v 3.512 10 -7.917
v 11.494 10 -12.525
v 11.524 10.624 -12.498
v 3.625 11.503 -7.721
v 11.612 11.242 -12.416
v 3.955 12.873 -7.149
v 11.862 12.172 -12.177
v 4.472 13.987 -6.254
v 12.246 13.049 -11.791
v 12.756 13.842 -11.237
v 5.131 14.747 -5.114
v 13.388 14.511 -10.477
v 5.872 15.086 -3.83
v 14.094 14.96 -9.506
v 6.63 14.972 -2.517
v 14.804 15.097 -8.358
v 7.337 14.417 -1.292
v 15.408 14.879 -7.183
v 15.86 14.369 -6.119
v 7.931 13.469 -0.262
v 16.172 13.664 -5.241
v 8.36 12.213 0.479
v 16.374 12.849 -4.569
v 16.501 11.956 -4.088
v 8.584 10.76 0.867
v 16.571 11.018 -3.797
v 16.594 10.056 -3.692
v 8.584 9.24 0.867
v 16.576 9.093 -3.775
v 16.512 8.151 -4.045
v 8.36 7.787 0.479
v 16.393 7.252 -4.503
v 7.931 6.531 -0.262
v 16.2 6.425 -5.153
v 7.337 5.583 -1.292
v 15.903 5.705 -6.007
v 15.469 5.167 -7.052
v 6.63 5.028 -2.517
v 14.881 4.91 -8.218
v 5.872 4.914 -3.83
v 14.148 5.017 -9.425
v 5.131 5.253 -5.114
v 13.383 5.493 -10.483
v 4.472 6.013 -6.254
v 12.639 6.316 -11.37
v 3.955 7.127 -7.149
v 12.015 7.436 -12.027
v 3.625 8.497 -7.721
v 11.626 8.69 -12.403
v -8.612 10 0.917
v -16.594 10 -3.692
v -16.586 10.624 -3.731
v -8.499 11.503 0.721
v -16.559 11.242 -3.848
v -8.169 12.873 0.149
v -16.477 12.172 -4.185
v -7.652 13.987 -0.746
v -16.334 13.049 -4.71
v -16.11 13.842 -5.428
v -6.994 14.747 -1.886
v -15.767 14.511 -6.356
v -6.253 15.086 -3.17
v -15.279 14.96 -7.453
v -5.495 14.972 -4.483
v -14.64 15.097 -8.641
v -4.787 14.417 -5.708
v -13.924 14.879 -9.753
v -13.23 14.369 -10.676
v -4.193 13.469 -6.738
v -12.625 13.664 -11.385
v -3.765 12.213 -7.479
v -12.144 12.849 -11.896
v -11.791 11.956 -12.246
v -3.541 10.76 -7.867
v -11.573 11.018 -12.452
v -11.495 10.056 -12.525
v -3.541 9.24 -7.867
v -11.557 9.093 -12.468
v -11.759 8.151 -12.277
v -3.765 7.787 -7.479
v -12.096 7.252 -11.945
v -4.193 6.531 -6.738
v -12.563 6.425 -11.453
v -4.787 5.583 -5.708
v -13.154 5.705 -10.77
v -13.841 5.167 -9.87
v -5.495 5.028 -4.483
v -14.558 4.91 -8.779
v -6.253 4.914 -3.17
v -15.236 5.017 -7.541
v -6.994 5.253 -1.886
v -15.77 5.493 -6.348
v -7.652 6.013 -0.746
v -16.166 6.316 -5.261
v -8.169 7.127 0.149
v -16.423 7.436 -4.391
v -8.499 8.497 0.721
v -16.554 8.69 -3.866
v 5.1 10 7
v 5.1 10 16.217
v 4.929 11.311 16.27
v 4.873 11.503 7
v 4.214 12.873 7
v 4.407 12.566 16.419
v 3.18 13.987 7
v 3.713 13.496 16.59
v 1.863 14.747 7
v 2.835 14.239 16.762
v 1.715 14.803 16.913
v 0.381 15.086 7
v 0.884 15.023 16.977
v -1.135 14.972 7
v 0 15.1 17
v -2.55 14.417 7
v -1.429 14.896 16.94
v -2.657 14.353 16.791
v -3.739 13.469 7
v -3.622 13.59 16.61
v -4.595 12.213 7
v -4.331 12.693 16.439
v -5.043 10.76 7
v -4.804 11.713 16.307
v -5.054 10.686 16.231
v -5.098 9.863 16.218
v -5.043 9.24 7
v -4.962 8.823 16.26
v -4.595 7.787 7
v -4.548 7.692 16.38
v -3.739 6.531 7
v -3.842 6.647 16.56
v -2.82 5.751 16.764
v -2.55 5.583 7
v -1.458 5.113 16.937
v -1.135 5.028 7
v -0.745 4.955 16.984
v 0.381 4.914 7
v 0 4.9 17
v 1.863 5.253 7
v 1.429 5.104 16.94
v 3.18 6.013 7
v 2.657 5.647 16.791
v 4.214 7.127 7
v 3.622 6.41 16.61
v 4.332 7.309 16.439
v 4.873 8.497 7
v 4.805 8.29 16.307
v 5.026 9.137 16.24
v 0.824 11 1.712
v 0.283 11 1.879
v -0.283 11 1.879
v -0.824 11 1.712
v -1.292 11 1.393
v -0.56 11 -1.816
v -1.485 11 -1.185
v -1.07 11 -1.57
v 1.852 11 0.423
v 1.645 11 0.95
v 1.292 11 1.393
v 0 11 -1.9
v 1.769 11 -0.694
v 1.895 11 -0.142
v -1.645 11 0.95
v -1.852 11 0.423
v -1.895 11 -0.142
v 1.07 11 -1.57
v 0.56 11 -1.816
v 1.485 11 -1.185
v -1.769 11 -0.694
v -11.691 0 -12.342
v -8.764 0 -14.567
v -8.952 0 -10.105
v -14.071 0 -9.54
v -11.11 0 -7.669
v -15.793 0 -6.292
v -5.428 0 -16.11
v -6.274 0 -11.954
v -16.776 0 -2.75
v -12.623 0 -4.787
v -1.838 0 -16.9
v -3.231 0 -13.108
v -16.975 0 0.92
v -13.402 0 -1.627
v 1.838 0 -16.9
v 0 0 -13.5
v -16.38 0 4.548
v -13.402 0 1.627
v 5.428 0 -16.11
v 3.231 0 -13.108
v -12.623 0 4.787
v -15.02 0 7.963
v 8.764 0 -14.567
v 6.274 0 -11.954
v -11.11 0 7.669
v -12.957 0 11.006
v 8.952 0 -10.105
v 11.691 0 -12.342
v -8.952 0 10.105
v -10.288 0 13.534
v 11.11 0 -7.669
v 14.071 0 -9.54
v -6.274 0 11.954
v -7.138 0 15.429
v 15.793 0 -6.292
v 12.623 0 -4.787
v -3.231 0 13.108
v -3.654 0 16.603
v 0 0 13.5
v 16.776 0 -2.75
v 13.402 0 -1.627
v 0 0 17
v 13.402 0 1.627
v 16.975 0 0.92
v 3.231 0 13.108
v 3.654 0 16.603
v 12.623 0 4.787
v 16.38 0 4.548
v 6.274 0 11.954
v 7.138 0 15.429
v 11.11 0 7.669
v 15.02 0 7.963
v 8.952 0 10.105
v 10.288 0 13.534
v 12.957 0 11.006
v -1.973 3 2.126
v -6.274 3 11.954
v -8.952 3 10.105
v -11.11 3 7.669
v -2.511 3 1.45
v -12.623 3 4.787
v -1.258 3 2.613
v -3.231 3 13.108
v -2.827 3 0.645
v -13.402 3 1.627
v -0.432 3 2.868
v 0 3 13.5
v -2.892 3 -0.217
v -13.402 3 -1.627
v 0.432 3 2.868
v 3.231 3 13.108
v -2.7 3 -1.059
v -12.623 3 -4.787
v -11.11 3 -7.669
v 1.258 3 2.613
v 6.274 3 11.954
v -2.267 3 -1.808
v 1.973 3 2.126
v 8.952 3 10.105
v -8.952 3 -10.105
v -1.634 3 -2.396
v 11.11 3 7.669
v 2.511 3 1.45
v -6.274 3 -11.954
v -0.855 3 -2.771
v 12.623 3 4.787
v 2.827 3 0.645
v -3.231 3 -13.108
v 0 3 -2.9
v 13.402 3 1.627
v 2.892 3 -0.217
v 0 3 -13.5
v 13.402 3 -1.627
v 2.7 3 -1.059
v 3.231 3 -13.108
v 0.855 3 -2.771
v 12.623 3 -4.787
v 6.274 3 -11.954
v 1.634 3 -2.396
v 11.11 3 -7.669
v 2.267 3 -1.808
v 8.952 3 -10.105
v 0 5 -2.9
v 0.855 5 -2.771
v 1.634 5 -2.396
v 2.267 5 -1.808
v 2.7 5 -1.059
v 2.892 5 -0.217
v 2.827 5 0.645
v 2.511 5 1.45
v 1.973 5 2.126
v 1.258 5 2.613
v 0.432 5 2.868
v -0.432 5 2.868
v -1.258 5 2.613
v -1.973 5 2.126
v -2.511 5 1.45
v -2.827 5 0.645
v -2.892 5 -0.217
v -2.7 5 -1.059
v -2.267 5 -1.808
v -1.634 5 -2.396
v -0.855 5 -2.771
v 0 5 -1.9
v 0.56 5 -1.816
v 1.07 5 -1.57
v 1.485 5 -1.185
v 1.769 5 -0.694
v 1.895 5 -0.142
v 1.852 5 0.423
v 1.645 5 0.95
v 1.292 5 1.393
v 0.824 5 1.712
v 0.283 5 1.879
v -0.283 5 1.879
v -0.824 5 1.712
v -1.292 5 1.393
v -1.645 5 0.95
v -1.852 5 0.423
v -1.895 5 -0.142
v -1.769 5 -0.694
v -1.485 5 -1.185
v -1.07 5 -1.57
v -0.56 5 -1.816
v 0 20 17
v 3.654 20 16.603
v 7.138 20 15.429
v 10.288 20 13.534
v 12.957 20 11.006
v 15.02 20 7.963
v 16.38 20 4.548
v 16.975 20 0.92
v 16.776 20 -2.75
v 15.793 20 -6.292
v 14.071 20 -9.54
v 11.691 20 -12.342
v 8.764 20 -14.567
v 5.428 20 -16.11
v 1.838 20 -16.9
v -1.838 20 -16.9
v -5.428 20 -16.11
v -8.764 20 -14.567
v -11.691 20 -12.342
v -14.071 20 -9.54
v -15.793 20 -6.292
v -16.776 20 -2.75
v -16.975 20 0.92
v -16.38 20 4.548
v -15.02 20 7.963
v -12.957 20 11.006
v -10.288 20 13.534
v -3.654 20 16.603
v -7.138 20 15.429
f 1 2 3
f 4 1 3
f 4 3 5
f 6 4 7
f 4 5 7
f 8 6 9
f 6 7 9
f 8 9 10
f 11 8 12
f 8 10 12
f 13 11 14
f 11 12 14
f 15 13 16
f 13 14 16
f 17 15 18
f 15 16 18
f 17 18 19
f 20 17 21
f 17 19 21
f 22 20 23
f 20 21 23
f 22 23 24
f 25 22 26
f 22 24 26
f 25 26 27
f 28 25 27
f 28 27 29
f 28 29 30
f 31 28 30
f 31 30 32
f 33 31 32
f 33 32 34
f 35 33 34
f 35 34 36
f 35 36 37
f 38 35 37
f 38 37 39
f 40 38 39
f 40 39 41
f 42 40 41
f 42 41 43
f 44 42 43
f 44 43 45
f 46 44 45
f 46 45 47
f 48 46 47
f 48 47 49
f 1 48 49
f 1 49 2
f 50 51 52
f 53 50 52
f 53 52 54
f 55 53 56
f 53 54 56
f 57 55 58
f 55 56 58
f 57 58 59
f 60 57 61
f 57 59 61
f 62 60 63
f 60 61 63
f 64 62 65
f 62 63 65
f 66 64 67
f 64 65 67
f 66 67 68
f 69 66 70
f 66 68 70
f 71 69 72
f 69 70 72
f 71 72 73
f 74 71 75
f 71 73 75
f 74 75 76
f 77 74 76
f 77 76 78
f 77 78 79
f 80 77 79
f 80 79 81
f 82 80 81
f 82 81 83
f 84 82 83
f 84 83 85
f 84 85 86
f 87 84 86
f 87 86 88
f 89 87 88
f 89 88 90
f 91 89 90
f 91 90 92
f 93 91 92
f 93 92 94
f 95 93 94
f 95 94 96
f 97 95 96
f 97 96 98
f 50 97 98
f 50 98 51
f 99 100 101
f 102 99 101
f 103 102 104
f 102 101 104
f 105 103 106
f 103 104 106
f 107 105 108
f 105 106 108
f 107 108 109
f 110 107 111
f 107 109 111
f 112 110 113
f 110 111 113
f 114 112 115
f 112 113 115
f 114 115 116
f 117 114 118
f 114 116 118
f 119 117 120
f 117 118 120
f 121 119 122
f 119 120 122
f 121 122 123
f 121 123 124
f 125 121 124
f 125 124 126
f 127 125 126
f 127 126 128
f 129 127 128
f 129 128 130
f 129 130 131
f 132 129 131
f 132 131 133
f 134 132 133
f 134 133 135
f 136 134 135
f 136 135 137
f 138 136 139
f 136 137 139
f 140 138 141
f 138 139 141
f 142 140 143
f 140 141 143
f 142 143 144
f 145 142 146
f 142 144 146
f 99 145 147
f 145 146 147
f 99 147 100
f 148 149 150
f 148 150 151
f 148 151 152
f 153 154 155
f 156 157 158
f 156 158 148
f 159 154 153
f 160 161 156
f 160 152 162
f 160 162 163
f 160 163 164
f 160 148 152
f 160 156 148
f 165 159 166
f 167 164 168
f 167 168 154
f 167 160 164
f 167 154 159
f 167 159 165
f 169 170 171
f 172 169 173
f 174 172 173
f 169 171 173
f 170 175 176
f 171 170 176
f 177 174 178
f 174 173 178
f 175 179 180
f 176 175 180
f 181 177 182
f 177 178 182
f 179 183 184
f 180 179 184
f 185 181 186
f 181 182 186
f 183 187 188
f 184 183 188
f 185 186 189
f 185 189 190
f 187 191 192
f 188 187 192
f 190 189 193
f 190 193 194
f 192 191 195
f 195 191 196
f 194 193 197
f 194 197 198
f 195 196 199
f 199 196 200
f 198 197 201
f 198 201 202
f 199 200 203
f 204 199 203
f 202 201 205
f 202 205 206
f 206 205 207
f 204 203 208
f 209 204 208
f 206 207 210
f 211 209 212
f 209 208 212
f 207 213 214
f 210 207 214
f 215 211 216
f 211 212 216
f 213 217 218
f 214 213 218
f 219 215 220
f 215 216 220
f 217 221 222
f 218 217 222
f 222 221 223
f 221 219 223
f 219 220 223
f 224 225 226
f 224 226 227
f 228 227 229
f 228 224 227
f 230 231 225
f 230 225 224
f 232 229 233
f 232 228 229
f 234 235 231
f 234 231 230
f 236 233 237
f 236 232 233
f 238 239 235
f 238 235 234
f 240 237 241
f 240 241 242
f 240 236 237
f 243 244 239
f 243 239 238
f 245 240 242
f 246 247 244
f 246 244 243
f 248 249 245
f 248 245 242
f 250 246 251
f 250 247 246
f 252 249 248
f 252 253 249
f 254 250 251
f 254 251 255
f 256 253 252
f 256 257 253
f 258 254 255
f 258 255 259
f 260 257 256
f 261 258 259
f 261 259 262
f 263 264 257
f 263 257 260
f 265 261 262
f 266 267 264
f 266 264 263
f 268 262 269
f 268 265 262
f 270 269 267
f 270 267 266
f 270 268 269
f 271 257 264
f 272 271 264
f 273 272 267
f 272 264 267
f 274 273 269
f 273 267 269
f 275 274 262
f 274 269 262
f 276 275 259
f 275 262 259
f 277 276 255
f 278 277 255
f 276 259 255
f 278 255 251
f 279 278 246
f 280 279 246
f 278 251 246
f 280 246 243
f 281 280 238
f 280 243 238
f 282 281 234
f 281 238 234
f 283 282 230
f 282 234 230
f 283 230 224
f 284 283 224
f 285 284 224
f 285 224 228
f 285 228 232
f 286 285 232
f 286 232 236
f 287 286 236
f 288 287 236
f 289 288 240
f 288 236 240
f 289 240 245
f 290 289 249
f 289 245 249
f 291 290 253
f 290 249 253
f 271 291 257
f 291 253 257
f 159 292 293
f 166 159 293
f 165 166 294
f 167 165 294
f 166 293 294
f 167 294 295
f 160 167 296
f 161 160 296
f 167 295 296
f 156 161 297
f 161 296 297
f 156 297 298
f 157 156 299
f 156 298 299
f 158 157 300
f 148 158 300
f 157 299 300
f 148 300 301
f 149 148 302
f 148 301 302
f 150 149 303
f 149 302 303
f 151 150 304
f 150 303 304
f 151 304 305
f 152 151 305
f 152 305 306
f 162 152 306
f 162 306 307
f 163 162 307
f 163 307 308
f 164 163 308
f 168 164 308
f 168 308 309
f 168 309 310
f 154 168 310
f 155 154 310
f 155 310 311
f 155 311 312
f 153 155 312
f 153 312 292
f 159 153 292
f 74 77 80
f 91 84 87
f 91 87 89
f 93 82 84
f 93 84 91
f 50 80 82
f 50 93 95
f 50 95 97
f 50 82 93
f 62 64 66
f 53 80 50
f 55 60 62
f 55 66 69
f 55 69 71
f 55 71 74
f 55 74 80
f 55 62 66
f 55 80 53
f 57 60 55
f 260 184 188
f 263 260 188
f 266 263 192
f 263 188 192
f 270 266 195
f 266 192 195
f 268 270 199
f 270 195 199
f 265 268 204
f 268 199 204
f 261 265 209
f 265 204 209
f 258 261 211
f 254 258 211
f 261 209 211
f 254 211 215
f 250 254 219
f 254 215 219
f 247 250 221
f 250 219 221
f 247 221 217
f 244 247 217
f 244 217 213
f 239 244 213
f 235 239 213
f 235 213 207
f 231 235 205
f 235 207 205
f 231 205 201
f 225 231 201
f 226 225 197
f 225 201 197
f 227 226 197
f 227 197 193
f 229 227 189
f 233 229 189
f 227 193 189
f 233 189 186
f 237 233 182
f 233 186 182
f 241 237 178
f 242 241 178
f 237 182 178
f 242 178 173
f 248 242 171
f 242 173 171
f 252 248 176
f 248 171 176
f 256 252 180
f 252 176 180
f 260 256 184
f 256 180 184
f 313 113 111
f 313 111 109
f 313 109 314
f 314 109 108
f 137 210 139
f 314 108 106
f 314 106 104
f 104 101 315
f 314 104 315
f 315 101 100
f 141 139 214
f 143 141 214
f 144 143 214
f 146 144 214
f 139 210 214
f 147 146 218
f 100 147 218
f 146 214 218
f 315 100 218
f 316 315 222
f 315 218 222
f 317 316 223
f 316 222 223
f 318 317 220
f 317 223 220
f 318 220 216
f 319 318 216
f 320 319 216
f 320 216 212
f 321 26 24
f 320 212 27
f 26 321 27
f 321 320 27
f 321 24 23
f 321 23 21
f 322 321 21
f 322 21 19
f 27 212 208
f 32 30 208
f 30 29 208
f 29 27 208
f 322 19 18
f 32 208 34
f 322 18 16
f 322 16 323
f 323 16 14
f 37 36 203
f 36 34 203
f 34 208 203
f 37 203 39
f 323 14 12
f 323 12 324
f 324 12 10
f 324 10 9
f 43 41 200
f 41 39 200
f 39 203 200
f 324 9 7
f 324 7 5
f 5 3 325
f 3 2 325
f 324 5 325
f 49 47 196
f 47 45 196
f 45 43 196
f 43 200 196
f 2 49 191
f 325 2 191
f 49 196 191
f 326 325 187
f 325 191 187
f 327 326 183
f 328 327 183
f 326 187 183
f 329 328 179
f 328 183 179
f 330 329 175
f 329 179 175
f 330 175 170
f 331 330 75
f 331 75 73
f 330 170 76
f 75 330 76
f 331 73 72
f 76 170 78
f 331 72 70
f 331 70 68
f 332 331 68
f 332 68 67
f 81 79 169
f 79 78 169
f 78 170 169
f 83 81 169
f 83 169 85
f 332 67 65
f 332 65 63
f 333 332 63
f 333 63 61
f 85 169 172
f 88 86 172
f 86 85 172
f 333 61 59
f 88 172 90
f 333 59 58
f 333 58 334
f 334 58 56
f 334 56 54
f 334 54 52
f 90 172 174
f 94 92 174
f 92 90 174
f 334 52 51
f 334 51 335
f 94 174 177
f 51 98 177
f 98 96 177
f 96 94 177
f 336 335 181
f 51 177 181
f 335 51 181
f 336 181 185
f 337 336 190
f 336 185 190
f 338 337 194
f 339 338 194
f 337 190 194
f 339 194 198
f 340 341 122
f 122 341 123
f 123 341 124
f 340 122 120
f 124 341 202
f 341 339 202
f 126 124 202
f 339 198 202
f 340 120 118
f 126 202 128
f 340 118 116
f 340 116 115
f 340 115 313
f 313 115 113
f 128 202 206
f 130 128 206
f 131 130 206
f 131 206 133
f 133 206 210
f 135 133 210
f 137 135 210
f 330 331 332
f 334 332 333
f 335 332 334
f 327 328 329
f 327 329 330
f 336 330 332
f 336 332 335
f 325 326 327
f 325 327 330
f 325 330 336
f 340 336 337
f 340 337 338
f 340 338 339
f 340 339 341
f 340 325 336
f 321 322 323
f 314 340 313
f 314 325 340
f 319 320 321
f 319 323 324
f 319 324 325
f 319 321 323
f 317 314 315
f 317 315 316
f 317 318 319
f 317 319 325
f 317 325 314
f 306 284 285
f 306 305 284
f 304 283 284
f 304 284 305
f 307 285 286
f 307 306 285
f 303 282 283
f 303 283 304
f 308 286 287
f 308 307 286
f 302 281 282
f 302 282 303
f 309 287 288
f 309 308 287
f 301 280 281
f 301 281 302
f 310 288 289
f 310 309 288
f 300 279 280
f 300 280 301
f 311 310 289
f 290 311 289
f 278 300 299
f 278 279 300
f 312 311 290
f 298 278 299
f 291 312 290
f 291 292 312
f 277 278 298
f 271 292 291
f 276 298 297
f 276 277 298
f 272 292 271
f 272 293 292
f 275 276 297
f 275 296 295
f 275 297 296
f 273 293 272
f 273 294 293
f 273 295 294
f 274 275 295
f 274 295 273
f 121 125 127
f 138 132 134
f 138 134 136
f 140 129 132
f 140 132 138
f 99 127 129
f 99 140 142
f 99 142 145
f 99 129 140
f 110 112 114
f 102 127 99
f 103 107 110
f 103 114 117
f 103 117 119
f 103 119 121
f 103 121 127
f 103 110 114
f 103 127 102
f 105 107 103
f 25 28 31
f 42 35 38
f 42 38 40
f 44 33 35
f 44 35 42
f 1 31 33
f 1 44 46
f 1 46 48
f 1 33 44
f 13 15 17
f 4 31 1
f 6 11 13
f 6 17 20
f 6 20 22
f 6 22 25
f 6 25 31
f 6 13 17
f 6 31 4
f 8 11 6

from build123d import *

# Parameters (mm, degrees)
CIRKEL_R                   = 17
CILINDER_DEPTH             = 20
CIRKEL_GAT_R               = 5.1
OPENING_DEPTH              = 10
GATEN_PATROON_COUNT        = 3
CIRKEL1_R                  = 13.5
OPENING_OPZET_DEPTH        = 3
CIRKEL2_R                  = 1.9
GAT_VERLOOPSTUK_DEPTH      = 8
CIRKEL3_R                  = 2.9
GAT_VERLOOPSTUK_RAND_DEPTH = 2


with BuildPart() as part:
    # cirkel → cilinder (new body)
    with BuildSketch(Plane(origin=(0, 0, 0), x_dir=(1, 0, 0), z_dir=(0, 1, 0))):
        with Locations(Location((0, 0, 0), (0, 0, 270))):
            Circle(CIRKEL_R)
    extrude(amount=CILINDER_DEPTH)

    # cirkel_gat → opening (cut)
    with BuildSketch(Plane.XY.offset(17)):
        with Locations((0, 10)):
            Circle(CIRKEL_GAT_R)
    opening = extrude(amount=-OPENING_DEPTH, mode=Mode.SUBTRACT)

    # gaten_patroon: opening ×3 about axis
    gaten_patroon_axis = Axis((0, 0, 0), (0, 1, 0))
    for i in range(1, GATEN_PATROON_COUNT):
        add(opening.rotate(gaten_patroon_axis, i * 360 / GATEN_PATROON_COUNT), mode=Mode.SUBTRACT)

    # cirkel1 → opening_opzet (cut)
    with BuildSketch(Plane(origin=(0, 0, 0), x_dir=(-1, 0, 0), z_dir=(0, -1, 0))):
        with Locations(Location((0, 0, 0), (0, 0, 90))):
            Circle(CIRKEL1_R)
    extrude(amount=-OPENING_OPZET_DEPTH, mode=Mode.SUBTRACT)

    # cirkel2 → gat_verloopstuk (cut)
    with BuildSketch(Plane(origin=(0, 3, 0), x_dir=(-1, 0, 0), z_dir=(0, -1, 0))):
        with Locations(Location((0, 0, 0), (0, 0, 90))):
            Circle(CIRKEL2_R)
    extrude(amount=-GAT_VERLOOPSTUK_DEPTH, mode=Mode.SUBTRACT)

    # cirkel3 → gat_verloopstuk_rand (cut)
    with BuildSketch(Plane.XZ.offset(-3)):
        with Locations(Location((0, 0, 0), (0, 0, 270))):
            Circle(CIRKEL3_R)
    extrude(amount=-GAT_VERLOOPSTUK_RAND_DEPTH, mode=Mode.SUBTRACT)


solid = part.part
